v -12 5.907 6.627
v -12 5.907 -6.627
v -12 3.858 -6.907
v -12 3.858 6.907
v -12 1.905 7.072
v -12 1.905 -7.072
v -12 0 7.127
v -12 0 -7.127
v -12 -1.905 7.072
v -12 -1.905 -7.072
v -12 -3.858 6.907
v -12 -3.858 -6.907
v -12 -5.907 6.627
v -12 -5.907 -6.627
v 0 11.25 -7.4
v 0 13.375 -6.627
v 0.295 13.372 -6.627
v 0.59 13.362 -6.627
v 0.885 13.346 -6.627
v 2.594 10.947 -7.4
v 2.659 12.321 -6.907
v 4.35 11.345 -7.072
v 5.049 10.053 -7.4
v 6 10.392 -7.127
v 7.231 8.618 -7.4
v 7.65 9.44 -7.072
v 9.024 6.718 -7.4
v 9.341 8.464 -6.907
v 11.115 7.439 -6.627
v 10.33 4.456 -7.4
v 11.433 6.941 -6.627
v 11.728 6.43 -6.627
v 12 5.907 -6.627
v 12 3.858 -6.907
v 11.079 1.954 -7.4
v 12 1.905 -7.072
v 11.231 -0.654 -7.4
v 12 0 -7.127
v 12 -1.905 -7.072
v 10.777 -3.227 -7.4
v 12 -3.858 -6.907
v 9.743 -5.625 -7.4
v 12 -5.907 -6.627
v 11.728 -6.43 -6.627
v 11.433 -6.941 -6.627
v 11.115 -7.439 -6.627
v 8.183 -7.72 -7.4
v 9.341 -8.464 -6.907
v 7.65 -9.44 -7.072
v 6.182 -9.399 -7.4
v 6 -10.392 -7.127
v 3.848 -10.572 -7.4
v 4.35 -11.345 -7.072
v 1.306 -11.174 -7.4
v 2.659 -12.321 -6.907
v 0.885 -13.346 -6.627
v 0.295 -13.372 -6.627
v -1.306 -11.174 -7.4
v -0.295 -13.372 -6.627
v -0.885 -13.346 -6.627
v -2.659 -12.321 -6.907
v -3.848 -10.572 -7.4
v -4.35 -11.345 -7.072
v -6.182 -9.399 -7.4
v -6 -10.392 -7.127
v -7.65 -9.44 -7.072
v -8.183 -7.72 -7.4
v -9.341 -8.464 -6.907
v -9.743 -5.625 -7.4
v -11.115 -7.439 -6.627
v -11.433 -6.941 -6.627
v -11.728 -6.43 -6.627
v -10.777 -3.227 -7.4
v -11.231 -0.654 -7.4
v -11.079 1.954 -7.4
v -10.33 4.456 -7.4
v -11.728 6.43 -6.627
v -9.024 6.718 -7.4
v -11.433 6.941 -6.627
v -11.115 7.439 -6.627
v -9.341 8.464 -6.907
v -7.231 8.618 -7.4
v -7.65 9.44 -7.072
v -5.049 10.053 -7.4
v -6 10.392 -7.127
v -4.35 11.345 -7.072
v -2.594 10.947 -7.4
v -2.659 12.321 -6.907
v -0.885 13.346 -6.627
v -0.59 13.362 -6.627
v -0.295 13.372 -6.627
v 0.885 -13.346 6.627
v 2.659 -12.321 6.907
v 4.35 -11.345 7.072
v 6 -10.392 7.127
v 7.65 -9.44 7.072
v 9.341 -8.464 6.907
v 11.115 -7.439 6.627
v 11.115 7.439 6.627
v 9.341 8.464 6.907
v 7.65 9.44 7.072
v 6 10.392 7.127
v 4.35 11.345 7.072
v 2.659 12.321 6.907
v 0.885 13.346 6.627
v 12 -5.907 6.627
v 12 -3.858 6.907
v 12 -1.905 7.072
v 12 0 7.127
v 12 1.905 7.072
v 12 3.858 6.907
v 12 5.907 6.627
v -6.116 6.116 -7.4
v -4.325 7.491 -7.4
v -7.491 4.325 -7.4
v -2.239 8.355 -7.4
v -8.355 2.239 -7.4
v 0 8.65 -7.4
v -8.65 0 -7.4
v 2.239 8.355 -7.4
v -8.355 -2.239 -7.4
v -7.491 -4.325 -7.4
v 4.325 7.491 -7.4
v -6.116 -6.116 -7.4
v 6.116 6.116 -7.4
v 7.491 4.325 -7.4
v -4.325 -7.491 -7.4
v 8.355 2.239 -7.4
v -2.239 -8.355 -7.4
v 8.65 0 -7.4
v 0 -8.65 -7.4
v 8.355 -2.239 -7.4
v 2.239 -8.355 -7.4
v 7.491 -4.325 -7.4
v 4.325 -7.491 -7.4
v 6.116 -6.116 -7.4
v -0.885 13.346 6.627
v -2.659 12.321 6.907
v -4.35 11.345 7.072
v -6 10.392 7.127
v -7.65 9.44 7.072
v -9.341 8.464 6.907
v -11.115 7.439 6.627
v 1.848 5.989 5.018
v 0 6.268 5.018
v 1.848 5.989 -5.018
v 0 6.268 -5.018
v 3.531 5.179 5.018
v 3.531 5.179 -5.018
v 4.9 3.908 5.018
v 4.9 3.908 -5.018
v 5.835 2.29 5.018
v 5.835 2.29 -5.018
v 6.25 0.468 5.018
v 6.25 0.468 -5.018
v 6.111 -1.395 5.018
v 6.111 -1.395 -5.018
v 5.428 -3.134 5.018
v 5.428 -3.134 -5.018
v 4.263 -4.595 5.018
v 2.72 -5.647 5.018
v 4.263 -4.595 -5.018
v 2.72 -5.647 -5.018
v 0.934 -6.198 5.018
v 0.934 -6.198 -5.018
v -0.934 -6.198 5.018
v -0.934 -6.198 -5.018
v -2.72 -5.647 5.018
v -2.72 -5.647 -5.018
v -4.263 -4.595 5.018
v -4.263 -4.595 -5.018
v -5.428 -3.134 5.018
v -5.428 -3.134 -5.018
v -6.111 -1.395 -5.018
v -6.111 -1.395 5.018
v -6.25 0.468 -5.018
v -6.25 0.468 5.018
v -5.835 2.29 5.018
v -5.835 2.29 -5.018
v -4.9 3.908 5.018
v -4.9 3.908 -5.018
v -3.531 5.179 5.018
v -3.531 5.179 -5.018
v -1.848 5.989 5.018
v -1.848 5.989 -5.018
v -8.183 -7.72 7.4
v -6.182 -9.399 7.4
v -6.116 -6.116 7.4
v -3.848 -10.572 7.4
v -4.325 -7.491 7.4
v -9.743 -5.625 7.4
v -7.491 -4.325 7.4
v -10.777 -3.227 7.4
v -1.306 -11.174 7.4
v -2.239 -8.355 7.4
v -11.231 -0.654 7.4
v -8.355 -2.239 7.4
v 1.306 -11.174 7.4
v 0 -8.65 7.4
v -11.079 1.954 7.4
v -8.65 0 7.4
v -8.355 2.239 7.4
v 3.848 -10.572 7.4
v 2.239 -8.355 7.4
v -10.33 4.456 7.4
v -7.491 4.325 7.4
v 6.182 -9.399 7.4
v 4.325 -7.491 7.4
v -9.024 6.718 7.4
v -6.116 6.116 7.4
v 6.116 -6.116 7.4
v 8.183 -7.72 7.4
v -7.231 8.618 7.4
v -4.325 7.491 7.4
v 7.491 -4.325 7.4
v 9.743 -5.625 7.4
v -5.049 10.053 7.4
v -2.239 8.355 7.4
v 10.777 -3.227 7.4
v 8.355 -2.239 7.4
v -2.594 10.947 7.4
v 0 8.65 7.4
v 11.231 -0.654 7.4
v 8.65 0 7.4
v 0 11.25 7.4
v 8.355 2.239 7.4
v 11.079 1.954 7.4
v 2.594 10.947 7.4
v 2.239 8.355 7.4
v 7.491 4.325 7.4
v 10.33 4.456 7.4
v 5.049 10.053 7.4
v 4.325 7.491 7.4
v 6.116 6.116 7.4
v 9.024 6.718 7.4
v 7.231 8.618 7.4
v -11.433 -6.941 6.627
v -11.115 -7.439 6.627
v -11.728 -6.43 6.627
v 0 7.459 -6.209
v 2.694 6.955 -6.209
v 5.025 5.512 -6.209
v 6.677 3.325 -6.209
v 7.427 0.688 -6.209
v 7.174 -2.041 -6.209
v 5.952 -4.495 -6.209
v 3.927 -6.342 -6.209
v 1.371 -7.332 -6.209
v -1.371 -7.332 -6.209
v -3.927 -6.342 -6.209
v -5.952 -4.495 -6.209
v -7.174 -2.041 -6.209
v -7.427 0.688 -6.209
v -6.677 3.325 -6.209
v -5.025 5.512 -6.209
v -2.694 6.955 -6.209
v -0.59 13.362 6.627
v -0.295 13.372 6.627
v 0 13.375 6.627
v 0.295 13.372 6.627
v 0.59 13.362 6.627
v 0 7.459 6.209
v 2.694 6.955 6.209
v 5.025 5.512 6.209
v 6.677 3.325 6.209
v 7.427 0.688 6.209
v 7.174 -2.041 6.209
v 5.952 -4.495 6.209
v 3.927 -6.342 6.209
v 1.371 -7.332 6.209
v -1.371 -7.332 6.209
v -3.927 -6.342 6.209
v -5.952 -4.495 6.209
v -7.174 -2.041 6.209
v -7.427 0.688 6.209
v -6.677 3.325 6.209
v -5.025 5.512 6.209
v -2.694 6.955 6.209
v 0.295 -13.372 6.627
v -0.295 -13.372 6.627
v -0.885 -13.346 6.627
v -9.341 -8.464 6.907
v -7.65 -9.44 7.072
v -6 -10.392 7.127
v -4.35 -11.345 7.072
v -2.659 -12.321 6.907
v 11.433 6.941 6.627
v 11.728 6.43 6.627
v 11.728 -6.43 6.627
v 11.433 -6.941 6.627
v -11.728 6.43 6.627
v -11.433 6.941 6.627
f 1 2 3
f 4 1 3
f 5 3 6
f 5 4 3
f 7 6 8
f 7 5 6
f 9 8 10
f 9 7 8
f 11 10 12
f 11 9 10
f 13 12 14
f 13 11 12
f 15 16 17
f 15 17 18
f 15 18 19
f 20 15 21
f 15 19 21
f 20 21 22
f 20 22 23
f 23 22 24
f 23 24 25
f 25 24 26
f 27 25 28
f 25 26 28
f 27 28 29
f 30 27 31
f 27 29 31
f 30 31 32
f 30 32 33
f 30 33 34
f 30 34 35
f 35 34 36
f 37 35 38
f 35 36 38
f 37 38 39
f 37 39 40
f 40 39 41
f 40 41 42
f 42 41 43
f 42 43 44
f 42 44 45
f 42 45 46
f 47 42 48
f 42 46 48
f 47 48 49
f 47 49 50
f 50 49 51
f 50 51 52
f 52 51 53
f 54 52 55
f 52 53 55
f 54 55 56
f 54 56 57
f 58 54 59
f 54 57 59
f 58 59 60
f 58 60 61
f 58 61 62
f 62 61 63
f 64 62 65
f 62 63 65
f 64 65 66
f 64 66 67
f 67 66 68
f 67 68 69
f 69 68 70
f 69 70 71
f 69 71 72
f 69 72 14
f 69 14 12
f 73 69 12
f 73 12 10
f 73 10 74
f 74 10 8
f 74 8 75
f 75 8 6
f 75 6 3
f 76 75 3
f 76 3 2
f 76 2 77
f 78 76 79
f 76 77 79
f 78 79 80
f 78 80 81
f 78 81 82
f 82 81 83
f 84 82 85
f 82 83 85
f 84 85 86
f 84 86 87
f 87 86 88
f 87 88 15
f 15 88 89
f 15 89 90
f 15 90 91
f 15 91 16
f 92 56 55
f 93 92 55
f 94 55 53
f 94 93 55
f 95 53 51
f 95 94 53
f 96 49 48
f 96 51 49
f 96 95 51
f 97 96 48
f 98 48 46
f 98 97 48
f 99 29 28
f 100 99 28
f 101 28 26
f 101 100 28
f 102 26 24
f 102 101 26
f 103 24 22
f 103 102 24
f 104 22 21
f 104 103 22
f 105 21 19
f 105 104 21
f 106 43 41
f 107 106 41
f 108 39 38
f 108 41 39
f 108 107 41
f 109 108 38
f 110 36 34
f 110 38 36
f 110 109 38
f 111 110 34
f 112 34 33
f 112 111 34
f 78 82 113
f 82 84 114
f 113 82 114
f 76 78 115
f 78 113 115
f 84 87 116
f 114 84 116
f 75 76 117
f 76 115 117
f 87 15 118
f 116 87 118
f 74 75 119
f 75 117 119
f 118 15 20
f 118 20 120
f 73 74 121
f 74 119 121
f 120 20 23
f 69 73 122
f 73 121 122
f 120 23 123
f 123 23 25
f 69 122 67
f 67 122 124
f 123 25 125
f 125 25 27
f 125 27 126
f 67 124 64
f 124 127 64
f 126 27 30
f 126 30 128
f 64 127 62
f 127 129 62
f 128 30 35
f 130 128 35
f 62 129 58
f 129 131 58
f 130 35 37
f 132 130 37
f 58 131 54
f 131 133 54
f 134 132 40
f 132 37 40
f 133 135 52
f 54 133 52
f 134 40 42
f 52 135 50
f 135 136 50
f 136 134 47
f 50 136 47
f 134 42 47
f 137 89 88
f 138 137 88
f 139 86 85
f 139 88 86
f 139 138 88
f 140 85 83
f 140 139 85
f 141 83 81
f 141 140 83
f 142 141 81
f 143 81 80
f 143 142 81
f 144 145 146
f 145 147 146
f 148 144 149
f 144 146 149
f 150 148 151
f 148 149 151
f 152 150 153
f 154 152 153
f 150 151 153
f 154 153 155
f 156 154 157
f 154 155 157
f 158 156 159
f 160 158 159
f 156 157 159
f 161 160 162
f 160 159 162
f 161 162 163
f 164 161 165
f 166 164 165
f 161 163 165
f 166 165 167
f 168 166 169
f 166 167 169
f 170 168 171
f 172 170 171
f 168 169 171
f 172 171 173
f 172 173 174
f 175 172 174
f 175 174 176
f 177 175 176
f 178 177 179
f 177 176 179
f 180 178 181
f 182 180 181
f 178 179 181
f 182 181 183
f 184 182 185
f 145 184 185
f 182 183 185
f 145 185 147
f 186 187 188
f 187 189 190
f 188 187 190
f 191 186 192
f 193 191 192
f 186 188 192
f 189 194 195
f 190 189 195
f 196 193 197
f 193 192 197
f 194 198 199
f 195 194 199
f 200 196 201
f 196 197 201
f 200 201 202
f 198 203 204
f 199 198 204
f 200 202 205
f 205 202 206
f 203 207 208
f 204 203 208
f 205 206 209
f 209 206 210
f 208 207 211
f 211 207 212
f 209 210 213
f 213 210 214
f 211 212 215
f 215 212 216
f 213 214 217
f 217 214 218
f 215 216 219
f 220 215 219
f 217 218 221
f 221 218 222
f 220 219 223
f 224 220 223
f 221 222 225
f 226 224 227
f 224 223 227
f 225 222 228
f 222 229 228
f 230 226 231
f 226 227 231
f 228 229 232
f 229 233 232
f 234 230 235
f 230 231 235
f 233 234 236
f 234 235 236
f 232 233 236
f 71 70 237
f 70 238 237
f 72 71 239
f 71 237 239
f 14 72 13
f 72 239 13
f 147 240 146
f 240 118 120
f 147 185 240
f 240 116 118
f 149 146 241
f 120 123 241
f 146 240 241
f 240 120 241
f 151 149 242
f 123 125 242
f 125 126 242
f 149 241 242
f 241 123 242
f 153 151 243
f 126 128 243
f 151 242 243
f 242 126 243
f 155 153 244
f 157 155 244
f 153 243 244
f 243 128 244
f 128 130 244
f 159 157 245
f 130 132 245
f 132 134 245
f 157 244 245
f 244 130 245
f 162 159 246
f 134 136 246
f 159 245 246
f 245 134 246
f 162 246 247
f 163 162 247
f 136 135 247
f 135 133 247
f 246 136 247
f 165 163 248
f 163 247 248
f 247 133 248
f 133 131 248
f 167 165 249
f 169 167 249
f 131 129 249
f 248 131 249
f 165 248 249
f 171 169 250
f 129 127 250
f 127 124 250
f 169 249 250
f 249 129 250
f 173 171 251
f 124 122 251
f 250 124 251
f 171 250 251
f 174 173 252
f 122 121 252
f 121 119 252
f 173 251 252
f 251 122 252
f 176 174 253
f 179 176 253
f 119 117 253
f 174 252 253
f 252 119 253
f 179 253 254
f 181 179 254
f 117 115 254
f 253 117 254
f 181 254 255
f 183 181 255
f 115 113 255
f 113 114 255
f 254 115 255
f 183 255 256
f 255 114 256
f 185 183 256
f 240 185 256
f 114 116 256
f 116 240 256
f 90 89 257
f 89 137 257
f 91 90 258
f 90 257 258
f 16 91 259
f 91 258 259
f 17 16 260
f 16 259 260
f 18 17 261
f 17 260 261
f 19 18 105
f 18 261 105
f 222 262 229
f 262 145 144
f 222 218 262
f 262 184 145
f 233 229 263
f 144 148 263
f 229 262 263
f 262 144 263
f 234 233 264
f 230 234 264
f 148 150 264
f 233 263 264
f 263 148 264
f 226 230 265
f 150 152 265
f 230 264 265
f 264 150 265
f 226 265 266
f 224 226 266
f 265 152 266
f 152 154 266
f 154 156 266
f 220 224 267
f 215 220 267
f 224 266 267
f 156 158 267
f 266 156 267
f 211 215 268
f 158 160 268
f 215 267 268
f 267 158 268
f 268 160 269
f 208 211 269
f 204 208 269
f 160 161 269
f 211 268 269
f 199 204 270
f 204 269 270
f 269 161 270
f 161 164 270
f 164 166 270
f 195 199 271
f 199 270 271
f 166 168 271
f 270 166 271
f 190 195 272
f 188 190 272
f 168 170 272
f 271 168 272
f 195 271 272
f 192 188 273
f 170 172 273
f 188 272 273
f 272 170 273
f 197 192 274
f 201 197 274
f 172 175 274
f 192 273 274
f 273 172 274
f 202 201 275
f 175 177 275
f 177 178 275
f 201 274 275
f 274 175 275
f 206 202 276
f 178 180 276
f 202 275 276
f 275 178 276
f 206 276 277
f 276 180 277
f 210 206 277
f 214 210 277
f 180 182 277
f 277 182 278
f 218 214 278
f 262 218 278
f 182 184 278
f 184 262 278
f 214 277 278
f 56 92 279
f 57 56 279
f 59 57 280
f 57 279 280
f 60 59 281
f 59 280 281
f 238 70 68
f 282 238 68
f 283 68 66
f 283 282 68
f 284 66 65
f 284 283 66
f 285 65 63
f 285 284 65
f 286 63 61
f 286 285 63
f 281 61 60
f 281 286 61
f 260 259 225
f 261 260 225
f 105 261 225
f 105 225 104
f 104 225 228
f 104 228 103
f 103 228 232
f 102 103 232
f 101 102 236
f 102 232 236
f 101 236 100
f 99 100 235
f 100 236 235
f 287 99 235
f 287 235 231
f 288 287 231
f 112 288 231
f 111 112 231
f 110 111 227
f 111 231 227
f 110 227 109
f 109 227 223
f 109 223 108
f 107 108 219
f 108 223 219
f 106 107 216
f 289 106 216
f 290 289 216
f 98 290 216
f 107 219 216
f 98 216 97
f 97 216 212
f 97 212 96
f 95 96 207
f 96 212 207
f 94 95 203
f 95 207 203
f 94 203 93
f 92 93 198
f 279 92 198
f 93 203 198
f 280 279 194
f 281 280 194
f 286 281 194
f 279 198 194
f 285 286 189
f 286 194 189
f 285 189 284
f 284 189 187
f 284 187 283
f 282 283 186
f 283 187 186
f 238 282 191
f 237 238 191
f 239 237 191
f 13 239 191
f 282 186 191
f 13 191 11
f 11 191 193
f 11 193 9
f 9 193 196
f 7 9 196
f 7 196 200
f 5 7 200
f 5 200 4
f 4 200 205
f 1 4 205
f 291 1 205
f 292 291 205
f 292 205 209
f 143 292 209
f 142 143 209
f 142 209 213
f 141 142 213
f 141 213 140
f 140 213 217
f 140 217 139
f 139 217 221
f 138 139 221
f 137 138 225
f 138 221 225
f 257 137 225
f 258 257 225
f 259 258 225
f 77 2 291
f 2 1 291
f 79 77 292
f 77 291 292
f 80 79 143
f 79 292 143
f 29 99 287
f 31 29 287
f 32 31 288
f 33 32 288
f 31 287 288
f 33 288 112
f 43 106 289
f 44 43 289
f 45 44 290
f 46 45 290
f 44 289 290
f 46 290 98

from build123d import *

# Parameters (mm, degrees)
SKETCH_2_OUTSIDE_W  = 36.874
SKETCH_2_OUTSIDE_H  = 36.874
CUT_EXTRUDE_1_DEPTH = 15.8


with BuildPart() as part:
    # Эскиз1 → Повернуть1 (revolve)
    with BuildSketch(Plane(origin=(0, 0, 0), x_dir=(0, 0, -1), z_dir=(1, 0, 0))):
        Polygon((-5.017949192, 6.267949192), (5.017949192, 6.267949192), (7.4, 8.65), (7.4, 11.25), (6.626563252, 13.375), (-6.626563252, 13.375), (-7.4, 11.25), (-7.4, 8.65), align=None)
    revolve(axis=Axis((0, 0, 152.740188543), (0, 0, -1)))

    # Эскиз2 outside → Вырез-Вытянуть1 (cut, through all)
    with BuildSketch(Plane.XY.offset(7.4)):
        Rectangle(SKETCH_2_OUTSIDE_W, SKETCH_2_OUTSIDE_H)
        Polygon((0, -13.856406461), (12, -6.92820323), (12, 6.92820323), (0, 13.856406461), (-12, 6.92820323), (-12, -6.92820323), align=None, mode=Mode.SUBTRACT)
    extrude(amount=-CUT_EXTRUDE_1_DEPTH, mode=Mode.SUBTRACT)


solid = part.part
